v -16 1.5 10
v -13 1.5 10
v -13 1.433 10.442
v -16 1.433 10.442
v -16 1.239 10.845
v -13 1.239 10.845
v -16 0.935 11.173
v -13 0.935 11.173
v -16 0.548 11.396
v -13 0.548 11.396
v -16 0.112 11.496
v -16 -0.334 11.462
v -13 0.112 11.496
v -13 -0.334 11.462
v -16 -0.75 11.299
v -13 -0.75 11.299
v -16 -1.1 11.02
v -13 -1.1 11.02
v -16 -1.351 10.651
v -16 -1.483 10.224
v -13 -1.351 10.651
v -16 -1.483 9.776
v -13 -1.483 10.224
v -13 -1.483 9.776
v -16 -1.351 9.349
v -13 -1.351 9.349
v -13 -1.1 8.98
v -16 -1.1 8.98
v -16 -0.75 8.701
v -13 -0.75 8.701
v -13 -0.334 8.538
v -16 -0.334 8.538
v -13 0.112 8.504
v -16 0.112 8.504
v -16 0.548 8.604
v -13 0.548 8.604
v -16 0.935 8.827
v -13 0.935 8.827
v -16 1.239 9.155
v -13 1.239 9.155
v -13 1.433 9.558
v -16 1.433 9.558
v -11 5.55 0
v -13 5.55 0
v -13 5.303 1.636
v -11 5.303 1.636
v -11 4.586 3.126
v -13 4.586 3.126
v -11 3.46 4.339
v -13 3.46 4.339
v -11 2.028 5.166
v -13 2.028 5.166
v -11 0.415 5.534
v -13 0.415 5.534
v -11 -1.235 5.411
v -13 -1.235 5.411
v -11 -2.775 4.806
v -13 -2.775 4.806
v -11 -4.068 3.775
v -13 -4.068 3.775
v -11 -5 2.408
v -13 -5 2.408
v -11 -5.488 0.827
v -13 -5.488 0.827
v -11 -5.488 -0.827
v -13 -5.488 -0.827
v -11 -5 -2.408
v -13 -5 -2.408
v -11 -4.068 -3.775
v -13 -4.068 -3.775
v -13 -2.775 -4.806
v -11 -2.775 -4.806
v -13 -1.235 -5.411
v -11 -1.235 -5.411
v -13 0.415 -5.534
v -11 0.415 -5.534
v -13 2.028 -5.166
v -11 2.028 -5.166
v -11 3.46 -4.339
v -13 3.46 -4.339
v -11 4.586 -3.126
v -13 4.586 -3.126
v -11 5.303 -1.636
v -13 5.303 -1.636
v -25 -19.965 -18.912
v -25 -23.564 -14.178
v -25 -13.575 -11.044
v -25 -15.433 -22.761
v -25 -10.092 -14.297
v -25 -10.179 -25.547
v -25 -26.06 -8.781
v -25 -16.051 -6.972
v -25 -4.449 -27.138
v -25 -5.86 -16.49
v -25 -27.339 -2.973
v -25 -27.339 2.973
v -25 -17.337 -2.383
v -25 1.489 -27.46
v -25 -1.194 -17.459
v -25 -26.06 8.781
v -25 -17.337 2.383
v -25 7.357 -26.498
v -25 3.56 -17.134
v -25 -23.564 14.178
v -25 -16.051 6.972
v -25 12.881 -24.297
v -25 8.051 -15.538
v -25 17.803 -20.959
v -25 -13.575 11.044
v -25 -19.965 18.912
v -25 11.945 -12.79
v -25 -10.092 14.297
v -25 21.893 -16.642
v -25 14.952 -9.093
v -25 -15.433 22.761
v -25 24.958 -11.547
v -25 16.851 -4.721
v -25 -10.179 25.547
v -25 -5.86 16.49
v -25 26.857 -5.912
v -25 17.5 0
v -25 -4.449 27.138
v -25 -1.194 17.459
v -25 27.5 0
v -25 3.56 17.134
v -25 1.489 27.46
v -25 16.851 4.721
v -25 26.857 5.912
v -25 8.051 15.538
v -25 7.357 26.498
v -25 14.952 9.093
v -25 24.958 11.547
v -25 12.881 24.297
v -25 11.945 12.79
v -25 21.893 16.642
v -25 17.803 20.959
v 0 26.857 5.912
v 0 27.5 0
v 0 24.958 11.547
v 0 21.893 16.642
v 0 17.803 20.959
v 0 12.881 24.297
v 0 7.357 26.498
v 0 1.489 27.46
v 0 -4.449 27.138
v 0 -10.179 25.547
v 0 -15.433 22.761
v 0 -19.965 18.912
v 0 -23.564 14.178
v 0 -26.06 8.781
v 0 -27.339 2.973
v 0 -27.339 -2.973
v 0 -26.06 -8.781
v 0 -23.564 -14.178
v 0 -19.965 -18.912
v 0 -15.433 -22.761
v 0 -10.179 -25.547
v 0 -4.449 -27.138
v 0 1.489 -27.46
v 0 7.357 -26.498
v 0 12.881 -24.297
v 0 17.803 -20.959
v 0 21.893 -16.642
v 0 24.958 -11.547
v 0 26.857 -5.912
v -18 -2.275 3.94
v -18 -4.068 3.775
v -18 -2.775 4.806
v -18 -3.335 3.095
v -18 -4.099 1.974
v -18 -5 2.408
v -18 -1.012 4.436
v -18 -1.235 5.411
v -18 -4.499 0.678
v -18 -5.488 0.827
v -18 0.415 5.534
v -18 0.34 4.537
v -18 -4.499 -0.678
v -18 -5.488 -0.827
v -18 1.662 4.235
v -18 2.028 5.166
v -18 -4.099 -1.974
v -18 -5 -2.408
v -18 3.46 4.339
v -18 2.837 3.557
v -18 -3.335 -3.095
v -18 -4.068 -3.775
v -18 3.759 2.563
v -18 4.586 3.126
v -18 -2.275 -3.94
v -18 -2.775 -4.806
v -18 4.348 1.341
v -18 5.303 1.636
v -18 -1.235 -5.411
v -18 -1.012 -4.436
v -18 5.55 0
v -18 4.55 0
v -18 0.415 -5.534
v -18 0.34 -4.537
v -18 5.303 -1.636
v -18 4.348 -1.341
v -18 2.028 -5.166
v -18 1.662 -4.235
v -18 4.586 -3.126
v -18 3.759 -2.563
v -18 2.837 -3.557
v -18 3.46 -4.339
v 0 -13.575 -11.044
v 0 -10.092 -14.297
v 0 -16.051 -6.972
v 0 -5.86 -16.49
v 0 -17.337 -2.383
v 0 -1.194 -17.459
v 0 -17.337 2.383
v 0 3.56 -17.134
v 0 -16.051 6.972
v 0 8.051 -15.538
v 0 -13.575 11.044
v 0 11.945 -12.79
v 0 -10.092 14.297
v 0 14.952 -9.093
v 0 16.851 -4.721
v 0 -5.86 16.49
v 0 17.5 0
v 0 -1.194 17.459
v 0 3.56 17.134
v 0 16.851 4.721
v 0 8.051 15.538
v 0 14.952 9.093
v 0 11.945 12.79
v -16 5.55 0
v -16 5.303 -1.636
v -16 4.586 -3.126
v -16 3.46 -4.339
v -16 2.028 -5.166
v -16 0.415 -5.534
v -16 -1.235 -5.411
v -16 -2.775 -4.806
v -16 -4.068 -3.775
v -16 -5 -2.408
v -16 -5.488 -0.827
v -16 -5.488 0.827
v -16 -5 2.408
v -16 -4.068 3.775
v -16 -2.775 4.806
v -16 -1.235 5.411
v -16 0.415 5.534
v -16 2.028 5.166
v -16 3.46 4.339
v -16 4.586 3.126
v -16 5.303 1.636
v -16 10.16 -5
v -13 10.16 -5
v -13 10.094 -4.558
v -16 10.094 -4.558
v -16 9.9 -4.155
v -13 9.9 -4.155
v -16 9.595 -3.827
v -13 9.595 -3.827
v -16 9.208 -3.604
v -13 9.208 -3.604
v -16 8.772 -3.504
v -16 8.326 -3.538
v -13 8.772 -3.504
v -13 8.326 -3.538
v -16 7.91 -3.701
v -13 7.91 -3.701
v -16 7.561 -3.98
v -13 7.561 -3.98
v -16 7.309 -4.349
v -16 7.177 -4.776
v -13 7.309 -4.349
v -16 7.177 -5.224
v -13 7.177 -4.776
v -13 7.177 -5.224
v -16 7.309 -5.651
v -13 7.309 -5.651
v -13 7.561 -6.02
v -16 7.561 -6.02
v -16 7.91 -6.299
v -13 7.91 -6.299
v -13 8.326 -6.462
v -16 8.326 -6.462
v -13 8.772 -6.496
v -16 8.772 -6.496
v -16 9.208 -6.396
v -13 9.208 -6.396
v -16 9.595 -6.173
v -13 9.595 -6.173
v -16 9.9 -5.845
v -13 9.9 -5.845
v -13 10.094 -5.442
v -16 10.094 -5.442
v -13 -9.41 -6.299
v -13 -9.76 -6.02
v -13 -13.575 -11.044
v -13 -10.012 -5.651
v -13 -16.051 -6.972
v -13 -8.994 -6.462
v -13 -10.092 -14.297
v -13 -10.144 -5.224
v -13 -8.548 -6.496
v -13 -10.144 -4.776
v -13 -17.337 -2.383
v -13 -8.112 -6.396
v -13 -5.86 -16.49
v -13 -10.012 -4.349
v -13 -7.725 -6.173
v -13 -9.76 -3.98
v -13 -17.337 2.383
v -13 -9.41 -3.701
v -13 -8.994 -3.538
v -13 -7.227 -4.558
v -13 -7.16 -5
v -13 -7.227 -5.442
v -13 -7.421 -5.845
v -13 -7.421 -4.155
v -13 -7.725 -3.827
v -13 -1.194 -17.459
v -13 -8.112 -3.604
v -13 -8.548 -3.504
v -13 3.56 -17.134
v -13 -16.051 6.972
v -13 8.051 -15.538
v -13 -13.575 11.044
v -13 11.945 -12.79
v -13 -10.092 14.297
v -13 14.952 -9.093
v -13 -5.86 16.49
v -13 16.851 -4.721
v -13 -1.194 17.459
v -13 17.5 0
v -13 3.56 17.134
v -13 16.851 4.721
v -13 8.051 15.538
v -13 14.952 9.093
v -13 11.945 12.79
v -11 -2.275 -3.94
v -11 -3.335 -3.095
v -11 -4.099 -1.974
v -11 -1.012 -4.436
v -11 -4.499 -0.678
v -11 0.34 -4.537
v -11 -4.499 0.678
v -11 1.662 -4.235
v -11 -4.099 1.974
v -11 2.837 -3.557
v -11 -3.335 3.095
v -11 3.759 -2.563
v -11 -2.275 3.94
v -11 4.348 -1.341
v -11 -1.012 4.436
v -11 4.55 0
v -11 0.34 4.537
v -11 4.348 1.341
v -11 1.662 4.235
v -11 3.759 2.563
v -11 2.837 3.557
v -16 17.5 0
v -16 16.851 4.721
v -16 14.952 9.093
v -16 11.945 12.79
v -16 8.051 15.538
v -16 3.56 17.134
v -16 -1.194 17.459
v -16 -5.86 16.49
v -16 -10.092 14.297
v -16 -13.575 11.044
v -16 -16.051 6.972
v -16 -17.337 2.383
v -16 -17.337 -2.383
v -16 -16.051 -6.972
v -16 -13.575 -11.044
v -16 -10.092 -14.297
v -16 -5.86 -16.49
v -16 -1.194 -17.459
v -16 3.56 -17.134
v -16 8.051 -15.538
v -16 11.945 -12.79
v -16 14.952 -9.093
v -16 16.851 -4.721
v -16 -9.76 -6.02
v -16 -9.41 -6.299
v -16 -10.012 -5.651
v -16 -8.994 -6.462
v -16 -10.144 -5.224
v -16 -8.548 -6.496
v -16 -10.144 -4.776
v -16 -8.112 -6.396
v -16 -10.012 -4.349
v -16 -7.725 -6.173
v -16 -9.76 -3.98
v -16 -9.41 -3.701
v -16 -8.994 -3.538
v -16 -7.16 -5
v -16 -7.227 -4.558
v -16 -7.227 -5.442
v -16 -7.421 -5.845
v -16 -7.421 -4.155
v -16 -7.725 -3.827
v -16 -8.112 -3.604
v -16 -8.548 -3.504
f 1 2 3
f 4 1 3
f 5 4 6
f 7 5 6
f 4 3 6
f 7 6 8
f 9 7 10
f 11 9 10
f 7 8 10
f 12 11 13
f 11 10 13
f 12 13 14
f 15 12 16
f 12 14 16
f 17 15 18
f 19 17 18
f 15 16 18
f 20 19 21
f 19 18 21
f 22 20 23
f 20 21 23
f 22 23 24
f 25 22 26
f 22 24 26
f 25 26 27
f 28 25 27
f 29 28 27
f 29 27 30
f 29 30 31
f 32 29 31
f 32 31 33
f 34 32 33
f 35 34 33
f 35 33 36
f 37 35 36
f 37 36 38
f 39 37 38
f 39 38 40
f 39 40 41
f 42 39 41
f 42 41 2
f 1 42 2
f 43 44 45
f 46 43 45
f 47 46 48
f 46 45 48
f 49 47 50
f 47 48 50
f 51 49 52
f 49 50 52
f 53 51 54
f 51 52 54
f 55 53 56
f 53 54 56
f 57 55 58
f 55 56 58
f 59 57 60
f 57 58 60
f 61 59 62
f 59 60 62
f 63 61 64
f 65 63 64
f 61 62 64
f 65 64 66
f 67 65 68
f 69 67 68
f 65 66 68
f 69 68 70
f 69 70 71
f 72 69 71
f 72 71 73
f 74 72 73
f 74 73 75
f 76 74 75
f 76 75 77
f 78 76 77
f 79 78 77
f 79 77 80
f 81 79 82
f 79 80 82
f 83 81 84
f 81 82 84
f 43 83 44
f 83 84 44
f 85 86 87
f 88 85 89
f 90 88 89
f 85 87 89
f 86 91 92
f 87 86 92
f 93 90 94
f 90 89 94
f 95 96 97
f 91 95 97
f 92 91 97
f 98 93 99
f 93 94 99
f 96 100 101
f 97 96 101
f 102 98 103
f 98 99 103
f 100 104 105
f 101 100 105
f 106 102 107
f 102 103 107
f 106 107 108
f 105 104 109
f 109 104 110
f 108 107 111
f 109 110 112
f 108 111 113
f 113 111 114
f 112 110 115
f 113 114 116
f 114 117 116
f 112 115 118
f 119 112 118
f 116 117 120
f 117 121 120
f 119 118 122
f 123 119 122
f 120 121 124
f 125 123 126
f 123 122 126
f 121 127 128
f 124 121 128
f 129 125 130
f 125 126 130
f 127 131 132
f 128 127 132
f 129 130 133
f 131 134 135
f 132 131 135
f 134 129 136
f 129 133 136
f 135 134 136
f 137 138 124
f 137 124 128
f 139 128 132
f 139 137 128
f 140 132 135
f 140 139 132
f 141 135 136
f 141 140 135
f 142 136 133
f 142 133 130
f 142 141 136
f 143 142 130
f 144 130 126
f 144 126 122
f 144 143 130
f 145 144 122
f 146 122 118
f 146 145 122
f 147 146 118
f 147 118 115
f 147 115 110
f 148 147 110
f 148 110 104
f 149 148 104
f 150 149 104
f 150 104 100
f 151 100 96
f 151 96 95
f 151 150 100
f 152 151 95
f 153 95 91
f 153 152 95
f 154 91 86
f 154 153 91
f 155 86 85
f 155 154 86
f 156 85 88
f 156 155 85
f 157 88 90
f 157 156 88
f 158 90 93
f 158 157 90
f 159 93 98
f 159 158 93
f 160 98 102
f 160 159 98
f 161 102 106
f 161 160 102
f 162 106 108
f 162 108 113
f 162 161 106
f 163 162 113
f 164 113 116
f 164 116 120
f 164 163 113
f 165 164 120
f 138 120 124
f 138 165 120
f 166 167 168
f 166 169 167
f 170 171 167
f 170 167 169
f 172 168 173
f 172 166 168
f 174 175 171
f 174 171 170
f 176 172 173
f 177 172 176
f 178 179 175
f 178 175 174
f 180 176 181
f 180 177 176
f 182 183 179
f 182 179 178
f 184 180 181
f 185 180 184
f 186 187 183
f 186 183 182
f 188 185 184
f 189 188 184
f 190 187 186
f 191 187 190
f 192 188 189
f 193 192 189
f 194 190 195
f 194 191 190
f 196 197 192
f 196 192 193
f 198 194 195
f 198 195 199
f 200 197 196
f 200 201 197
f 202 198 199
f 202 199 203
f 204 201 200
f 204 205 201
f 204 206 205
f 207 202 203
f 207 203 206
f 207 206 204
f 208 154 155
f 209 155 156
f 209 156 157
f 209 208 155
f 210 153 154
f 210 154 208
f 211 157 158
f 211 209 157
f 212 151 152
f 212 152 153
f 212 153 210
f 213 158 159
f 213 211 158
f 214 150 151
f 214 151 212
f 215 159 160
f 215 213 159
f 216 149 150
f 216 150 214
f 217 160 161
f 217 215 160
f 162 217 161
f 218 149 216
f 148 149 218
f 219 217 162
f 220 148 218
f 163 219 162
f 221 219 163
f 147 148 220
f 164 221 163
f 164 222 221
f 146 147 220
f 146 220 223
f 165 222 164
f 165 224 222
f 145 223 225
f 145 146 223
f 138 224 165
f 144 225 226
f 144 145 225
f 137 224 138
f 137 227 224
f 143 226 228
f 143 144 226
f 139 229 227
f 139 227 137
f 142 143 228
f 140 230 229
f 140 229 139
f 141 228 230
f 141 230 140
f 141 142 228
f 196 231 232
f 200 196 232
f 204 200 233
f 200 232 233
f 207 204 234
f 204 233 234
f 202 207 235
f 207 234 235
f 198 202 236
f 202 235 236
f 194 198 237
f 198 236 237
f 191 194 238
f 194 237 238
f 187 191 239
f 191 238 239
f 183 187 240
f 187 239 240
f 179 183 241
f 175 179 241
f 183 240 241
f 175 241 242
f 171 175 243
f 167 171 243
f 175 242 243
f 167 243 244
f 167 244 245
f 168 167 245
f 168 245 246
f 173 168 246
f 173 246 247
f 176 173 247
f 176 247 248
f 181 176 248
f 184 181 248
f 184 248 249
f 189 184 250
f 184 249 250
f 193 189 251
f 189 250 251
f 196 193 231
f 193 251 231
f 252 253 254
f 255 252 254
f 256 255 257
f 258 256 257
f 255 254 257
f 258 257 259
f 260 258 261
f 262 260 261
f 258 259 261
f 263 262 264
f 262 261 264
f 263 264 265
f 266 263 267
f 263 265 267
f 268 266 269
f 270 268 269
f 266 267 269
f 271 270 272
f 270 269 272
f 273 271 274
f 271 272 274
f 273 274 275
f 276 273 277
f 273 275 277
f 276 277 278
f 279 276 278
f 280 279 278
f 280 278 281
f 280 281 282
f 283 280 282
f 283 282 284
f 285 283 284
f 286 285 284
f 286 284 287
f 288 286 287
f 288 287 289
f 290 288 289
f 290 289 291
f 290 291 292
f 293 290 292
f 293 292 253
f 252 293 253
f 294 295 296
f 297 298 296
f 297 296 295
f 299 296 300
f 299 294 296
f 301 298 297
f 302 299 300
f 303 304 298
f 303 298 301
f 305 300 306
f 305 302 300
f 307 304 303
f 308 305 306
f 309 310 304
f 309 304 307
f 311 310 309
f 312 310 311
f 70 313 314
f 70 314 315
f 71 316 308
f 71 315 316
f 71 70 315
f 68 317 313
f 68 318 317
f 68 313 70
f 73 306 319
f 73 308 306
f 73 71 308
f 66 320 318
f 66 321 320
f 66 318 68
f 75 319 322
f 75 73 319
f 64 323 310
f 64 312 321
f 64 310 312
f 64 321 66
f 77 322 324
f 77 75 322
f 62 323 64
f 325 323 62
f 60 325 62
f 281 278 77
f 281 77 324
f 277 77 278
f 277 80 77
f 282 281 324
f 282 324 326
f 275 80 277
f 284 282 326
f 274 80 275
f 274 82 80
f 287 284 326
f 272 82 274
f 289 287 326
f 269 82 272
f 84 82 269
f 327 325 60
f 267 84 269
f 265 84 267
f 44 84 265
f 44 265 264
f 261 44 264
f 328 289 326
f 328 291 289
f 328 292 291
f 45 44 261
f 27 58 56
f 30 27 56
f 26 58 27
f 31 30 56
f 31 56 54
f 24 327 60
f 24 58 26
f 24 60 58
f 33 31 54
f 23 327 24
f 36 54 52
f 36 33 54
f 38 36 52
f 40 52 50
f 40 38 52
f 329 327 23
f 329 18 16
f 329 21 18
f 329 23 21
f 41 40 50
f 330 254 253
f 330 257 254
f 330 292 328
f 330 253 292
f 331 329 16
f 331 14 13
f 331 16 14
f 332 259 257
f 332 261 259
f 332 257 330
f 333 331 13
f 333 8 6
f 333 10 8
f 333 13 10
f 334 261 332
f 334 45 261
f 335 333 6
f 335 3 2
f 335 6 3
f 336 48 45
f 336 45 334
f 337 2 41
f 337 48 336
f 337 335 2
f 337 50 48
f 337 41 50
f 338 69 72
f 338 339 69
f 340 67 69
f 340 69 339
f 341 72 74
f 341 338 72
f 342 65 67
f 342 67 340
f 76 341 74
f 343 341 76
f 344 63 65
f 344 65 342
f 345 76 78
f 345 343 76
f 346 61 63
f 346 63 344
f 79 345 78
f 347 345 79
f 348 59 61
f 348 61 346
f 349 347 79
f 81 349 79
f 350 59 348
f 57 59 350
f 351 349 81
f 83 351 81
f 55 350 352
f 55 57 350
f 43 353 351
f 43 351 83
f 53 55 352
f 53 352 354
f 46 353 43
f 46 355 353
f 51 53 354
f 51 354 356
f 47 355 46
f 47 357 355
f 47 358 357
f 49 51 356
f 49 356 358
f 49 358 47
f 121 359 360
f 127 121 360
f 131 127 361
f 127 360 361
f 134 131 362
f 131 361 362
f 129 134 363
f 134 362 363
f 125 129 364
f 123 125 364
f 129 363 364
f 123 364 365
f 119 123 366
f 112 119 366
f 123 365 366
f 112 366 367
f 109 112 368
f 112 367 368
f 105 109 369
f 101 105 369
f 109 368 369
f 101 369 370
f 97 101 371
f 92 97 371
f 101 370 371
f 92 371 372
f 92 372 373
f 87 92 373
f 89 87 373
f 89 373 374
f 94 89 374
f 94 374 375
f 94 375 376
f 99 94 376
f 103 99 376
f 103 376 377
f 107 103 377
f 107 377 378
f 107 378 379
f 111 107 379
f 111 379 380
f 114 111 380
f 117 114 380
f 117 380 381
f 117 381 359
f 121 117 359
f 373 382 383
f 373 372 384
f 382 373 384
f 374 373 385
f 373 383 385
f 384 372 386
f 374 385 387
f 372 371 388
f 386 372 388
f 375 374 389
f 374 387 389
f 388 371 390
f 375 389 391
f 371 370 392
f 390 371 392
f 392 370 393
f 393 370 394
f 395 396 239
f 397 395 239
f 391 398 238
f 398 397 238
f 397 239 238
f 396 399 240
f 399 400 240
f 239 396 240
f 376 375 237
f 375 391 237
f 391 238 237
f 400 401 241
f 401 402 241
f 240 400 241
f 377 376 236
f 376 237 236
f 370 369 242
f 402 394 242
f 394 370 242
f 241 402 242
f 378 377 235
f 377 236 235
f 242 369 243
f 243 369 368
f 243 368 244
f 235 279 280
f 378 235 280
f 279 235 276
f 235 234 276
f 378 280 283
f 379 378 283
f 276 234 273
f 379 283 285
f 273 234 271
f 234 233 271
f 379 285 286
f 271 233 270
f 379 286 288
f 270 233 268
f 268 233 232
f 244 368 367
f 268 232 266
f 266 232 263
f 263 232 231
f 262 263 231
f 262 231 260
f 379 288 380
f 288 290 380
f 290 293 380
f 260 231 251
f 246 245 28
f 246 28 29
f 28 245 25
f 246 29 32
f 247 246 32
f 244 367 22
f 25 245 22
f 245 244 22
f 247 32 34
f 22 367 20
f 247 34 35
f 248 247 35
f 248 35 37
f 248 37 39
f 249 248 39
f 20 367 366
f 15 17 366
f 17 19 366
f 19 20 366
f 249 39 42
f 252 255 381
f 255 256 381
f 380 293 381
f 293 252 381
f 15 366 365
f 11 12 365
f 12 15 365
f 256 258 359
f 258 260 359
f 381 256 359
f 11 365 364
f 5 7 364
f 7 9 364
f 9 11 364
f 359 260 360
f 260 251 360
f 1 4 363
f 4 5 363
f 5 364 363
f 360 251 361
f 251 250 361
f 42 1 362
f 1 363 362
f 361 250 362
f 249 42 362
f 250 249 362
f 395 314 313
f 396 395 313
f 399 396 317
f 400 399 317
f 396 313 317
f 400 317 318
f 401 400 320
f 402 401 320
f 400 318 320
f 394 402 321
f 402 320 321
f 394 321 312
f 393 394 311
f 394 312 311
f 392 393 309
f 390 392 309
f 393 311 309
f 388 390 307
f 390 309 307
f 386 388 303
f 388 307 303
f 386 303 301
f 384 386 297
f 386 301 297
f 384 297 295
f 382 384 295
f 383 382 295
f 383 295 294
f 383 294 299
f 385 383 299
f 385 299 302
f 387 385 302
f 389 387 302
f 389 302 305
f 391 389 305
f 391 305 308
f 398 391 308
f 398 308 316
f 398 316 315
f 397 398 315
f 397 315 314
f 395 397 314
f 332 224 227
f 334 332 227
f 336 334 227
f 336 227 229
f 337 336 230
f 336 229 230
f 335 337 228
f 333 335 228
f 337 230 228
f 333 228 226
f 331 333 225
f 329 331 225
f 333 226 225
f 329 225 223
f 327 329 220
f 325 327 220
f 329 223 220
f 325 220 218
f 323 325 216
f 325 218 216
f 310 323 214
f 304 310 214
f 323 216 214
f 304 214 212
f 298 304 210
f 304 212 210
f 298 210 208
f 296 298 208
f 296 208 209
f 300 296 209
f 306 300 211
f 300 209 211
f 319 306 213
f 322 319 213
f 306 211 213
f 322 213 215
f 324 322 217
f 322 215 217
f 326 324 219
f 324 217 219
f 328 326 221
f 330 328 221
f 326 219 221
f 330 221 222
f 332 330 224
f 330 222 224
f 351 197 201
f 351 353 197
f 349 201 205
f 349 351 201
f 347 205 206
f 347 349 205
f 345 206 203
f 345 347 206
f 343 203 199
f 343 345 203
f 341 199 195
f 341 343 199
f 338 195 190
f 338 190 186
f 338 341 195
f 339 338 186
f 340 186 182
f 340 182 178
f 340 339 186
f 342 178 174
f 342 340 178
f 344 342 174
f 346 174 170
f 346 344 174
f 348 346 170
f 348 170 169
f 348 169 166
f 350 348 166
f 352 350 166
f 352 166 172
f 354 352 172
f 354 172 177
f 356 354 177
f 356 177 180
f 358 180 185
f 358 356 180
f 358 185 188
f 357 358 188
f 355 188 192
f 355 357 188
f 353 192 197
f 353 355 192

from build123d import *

# Parameters (mm, degrees)
SKETCH_R      = 27.5
SKETCH_R_2    = 17.5
PAD_DEPTH     = 25
SKETCH001_R   = 17.5
SKETCH001_R_2 = 4.55
SKETCH001_R_3 = 1.5
PAD001_DEPTH  = 16
SKETCH002_R   = 17.5
POCKET_DEPTH  = 13
SKETCH003_R   = 5.55
SKETCH003_R_2 = 4.55
PAD002_DEPTH  = 2
SKETCH004_R   = 5.55
SKETCH004_R_2 = 4.55
PAD003_DEPTH  = 2


with BuildPart() as part:
    # Sketch → Pad (new body)
    with BuildSketch(Plane.YZ):
        Circle(SKETCH_R)
        Circle(SKETCH_R_2, mode=Mode.SUBTRACT)
    extrude(amount=-PAD_DEPTH)

    # Sketch001 → Pad001 (join)
    with BuildSketch(Plane.YZ):
        Circle(SKETCH001_R)
        Circle(SKETCH001_R_2, mode=Mode.SUBTRACT)
        with Locations((0, 10)):
            Circle(SKETCH001_R_3, mode=Mode.SUBTRACT)
        with Locations((-8.660254, -5)):
            Circle(SKETCH001_R_3, mode=Mode.SUBTRACT)
        with Locations((8.660254, -5)):
            Circle(SKETCH001_R_3, mode=Mode.SUBTRACT)
    extrude(amount=-PAD001_DEPTH)

    # Sketch002 → Pocket (cut)
    with BuildSketch(Plane.YZ):
        Circle(SKETCH002_R)
    extrude(amount=-POCKET_DEPTH, mode=Mode.SUBTRACT)

    # Sketch003 (on Face6 of Pocket) → Pad002 (join)
    with BuildSketch(Plane.YZ.offset(-13)):
        Circle(SKETCH003_R)
        Circle(SKETCH003_R_2, mode=Mode.SUBTRACT)
    extrude(amount=PAD002_DEPTH)

    # Sketch004 (on Face7 of Pad002) → Pad003 (join)
    with BuildSketch(Plane(origin=(-16, 0, 0), x_dir=(0, 1, 0), z_dir=(-1, 0, 0))):
        Circle(SKETCH004_R)
        Circle(SKETCH004_R_2, mode=Mode.SUBTRACT)
    extrude(amount=PAD003_DEPTH)


solid = part.part
